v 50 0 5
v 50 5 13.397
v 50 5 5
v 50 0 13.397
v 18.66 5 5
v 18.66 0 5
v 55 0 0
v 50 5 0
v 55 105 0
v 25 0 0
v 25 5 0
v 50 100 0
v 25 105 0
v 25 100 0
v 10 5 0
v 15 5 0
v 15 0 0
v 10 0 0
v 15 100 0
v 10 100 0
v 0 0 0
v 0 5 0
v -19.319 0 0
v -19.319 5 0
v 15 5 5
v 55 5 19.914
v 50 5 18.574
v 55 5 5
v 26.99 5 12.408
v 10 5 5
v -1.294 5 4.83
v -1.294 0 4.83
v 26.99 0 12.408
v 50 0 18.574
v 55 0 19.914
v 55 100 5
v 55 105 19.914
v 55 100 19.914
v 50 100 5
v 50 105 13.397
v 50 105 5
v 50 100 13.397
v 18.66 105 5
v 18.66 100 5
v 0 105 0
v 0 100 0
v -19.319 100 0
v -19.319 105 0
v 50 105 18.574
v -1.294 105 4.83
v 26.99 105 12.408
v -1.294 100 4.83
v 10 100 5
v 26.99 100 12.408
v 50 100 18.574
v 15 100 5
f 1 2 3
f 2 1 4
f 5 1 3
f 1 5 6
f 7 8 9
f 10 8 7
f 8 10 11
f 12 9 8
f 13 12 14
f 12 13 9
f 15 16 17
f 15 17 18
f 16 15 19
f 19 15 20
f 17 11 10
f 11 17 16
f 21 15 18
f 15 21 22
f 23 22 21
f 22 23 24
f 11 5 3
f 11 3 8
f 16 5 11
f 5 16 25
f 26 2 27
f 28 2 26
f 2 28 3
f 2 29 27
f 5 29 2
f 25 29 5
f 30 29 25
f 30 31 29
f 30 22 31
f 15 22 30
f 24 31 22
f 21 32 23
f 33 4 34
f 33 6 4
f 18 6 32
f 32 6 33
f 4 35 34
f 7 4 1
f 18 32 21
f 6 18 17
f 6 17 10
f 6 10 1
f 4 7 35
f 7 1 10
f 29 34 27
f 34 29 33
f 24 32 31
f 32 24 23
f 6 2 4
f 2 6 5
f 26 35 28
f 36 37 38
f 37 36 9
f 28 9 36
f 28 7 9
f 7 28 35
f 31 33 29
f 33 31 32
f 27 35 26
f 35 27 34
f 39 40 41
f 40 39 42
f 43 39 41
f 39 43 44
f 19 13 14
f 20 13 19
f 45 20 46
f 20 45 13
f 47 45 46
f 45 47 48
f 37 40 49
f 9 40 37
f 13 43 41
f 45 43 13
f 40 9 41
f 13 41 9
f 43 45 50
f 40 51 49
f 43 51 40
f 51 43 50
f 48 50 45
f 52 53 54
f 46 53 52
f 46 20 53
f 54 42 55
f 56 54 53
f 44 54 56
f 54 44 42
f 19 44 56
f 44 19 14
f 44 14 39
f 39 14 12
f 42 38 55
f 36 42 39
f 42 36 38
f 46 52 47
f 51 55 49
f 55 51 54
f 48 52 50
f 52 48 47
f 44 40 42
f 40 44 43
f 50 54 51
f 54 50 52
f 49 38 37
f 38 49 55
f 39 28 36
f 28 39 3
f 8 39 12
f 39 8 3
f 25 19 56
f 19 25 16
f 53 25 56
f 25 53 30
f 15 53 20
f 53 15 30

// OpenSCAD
module triangle() {
    difference() {
        union() {
            difference() {
                union() {
                    cube([50, 5, 5]);

                    rotate([0, -15, 0])
                        translate([-20, 0, 0])
                            cube([80, 5, 5]);
                }
                translate([50, 0, 0])
                    cube([10, 5, 50]);
                
                translate([-25, 0, -10])
                    cube([50, 5, 10]);
            }
            translate([50, 0, 0])
                cube([5, 5, 20]);
        }
        rotate([0, -15, 0])
            translate([0, 0, 5])
                cube([80, 5, 5]);
    }
}

module wedge() {
    triangle();
    translate([0, 100, 0])
        triangle(); 
    translate([50, 0, 0])
        cube([5, 100, 5]);
    translate([10, 0, 0])
        cube([5, 100, 5]);    
}


wedge();
